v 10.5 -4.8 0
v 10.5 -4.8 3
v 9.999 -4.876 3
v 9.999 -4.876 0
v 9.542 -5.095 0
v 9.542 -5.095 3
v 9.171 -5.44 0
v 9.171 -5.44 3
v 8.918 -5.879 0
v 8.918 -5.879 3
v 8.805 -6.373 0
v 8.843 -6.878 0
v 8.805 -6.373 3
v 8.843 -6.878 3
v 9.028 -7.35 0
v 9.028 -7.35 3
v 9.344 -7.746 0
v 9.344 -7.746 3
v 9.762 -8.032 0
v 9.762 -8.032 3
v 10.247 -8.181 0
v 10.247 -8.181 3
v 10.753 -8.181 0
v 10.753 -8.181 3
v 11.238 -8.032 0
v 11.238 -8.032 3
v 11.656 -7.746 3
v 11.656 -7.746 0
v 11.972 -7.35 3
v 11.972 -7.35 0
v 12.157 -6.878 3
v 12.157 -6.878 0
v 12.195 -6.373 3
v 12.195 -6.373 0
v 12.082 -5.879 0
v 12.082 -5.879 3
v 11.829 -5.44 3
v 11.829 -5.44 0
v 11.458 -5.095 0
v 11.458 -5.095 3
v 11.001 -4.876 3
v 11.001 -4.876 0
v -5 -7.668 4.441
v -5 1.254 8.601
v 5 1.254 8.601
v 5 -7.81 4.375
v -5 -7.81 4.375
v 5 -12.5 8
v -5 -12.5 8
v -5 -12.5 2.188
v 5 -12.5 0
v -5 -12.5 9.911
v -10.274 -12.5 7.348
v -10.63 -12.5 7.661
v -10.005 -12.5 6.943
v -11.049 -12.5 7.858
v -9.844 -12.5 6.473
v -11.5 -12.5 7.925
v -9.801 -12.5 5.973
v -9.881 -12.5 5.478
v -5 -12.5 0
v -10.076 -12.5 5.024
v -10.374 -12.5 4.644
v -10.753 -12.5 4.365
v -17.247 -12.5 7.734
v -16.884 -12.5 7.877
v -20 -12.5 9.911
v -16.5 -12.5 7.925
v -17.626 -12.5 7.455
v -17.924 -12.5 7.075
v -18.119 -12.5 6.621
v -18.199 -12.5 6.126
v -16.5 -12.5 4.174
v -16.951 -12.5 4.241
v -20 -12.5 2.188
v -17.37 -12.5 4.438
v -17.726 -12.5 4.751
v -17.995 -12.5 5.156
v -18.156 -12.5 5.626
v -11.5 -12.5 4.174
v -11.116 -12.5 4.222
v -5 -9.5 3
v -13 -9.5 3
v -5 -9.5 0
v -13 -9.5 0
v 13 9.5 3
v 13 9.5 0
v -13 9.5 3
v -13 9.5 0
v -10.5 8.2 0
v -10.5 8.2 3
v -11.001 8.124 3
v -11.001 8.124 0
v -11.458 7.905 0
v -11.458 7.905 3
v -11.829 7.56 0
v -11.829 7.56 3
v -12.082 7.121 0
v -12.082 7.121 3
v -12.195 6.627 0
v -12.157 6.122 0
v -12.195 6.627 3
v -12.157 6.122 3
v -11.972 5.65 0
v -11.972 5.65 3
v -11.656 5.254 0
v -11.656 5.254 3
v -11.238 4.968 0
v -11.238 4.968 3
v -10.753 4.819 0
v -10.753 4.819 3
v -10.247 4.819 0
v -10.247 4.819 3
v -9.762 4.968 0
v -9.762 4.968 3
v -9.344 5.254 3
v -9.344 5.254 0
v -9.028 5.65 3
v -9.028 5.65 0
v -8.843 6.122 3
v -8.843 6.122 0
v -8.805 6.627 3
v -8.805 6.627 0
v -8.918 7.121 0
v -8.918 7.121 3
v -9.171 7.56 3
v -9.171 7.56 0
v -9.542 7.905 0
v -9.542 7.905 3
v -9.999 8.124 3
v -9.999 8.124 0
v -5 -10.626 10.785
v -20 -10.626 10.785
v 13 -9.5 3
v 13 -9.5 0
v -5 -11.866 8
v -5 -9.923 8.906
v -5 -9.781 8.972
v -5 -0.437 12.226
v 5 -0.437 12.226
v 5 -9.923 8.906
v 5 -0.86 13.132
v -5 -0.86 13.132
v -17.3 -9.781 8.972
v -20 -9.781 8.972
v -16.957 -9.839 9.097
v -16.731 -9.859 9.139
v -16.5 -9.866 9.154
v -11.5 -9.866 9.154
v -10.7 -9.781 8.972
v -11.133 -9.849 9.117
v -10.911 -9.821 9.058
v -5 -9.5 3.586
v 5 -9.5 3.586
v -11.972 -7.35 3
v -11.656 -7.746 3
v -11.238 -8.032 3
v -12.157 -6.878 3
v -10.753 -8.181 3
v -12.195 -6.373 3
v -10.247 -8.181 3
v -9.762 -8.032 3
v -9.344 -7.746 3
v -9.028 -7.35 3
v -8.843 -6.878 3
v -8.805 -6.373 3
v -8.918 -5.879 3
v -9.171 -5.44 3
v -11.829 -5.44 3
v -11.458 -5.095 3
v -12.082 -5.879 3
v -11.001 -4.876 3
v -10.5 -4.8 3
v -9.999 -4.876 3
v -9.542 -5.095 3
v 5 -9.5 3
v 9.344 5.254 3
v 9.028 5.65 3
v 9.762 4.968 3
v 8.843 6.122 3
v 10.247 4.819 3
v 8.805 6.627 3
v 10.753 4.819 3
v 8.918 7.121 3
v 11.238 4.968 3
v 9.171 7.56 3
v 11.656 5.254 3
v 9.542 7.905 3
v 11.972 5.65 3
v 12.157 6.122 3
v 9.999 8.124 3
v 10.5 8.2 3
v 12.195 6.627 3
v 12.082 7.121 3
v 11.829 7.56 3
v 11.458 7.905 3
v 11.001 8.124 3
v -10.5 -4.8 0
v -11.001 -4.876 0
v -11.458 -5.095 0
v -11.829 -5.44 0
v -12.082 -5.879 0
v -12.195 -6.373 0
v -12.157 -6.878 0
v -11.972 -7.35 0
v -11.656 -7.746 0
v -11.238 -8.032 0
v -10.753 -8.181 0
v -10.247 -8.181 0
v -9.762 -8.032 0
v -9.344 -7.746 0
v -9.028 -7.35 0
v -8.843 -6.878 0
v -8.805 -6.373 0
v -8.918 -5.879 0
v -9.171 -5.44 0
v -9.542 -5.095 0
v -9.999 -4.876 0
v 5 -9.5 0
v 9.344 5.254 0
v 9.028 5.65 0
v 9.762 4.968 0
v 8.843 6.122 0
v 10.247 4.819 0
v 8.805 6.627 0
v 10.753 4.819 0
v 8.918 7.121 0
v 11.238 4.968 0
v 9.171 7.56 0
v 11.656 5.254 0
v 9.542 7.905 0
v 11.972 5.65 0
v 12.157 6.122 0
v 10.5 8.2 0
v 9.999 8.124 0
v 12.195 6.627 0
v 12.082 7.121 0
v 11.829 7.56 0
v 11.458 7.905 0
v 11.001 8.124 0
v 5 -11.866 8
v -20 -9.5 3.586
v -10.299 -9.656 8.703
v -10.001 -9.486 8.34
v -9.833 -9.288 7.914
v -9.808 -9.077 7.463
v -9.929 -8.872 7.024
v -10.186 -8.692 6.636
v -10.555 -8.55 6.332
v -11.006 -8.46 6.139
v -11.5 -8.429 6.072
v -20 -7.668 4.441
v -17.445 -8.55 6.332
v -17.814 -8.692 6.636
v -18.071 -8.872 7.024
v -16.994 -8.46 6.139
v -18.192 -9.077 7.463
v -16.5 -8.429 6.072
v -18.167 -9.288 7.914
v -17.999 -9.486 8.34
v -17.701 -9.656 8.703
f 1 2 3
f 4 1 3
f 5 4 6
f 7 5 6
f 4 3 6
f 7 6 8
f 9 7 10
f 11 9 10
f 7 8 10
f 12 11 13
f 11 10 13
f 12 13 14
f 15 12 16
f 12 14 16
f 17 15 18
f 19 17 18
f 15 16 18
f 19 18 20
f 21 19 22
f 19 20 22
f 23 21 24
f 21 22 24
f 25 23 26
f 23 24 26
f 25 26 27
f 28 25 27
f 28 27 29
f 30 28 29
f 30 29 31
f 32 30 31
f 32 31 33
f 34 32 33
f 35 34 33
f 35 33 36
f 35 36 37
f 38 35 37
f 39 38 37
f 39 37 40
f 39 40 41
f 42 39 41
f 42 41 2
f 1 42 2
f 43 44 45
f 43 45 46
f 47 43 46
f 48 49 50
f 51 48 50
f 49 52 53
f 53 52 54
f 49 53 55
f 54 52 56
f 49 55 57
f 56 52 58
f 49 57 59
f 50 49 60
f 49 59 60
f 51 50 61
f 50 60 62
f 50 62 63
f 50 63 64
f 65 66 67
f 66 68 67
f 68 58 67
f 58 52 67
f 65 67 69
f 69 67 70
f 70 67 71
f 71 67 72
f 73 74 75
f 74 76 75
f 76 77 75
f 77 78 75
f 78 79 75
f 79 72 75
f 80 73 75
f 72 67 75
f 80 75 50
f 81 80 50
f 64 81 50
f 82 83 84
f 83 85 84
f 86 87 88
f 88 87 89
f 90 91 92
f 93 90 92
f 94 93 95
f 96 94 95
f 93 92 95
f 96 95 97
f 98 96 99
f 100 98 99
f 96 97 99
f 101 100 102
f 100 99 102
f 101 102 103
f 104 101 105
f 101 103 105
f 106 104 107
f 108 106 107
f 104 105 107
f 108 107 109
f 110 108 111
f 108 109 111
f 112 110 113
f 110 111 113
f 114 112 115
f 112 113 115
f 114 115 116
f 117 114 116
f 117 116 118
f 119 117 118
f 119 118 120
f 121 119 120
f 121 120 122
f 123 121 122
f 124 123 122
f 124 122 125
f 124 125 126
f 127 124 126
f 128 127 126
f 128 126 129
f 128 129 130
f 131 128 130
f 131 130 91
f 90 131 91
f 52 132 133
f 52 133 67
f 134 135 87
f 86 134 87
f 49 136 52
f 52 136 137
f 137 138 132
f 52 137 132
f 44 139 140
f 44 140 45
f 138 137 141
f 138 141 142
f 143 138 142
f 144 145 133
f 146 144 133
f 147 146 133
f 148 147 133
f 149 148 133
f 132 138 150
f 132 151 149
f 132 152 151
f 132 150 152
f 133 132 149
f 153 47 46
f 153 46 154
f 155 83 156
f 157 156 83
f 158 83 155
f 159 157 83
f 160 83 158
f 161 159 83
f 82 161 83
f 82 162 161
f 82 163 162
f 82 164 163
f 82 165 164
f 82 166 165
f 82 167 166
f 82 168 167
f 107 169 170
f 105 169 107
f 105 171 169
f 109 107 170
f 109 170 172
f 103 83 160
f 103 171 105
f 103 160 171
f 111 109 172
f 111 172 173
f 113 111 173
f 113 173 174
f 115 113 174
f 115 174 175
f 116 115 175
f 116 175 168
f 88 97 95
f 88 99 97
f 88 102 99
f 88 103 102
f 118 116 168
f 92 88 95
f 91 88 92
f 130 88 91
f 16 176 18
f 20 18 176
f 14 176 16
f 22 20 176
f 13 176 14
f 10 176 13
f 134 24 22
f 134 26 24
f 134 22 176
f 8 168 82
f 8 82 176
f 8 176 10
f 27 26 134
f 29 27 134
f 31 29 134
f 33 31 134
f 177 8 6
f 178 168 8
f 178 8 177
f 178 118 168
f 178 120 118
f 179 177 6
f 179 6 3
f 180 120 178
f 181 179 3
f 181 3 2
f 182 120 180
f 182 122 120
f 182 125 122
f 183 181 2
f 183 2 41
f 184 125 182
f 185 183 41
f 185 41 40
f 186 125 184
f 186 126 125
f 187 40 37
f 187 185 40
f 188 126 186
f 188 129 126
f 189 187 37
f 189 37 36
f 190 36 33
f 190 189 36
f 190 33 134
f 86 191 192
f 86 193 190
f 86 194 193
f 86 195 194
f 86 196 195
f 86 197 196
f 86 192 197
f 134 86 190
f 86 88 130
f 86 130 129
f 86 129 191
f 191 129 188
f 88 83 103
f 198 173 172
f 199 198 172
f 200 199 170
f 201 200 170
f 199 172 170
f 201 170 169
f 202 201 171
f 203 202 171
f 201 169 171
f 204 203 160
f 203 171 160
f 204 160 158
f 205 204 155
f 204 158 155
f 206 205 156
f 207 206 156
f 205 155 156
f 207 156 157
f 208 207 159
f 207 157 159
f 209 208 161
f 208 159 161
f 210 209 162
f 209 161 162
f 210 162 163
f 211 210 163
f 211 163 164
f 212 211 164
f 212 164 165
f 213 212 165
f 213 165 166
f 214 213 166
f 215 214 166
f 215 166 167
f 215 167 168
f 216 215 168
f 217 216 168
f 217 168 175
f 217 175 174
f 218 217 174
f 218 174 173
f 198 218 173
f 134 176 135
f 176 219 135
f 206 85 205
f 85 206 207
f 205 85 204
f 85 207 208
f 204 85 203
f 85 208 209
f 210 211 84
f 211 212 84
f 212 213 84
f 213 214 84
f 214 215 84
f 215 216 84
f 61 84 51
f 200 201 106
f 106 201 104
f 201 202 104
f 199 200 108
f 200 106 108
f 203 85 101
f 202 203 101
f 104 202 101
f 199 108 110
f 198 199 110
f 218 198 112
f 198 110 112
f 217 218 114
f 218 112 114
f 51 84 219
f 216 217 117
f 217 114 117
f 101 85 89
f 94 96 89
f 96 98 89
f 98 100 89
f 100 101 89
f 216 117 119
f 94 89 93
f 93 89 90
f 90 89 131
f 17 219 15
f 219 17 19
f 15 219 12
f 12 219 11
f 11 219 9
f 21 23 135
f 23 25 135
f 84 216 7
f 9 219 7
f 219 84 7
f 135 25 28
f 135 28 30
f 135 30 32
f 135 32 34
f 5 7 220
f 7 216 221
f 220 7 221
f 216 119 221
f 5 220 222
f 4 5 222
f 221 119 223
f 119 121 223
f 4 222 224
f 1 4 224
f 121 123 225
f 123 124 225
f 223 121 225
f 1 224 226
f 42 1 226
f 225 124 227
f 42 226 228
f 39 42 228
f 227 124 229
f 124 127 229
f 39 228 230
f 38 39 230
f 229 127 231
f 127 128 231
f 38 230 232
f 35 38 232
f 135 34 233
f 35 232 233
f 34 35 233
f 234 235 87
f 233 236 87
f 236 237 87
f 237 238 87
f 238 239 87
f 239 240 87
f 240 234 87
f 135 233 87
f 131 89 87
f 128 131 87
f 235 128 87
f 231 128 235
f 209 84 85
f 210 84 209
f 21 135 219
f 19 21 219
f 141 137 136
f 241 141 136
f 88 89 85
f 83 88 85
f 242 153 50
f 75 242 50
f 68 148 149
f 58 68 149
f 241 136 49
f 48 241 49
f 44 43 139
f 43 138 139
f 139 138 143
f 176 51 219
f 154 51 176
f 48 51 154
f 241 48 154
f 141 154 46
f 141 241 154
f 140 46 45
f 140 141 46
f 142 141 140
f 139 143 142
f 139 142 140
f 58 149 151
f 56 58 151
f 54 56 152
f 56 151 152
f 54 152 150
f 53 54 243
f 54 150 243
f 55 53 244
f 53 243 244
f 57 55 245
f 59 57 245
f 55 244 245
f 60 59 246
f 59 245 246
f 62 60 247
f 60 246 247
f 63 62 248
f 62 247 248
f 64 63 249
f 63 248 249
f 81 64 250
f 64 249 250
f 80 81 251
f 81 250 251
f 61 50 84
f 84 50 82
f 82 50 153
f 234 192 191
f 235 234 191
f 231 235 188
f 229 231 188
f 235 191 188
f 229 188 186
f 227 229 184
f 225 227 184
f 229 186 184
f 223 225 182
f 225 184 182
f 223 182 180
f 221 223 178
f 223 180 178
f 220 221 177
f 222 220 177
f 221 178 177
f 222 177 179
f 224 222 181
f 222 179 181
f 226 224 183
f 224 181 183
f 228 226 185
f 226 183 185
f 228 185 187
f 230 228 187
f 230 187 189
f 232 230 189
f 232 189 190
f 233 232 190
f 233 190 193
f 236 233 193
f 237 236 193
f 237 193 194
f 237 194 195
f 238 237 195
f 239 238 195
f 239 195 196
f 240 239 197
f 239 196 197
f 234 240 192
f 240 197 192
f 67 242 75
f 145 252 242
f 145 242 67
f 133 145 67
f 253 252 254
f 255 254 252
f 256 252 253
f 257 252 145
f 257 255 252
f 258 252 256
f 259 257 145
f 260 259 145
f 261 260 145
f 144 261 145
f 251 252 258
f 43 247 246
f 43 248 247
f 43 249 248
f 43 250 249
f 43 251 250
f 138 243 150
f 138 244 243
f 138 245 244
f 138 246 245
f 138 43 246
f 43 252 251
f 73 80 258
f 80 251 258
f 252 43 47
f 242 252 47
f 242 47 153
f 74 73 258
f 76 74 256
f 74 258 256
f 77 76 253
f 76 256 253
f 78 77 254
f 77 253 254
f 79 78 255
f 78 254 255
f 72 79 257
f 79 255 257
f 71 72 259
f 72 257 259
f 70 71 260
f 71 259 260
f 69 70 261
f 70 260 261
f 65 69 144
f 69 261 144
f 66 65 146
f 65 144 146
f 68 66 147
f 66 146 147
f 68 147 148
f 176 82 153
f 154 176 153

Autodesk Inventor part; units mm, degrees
ref_plane "YZ Plane" through (0, 0, 0) normal (1, 0, 0) x (0, 1, 0)
ref_plane "XZ Plane" through (0, 0, 0) normal (0, 1, 0) x (-1, 0, 0)
ref_plane "XY Plane" through (0, 0, 0) normal (0, 0, 1) x (1, 0, 0)
sketch "Sketch2" plane through (0, 0, 0) normal (0, 0, 1) x (1, 0, 0)
  line L0 (-13, -9.5) -> (13, -9.5)
  line L1 (13, -9.5) -> (13, 9.5)
  line L2 (13, 9.5) -> (-13, 9.5)
  line L3 (-13, 9.5) -> (-13, -9.5)
  line L4 (-13, -9.5) -> (13, 9.5) construction
  line L5 (13, -9.5) -> (-13, 9.5) construction
  point P0 (0, 0)
  dimension "d2" = 26
  dimension "d3" = 19
extrude "Extrusion1" add sketch "Sketch2" along normal blind 3
sketch "Sketch1" plane through (0, 0, 0) normal (0, 0, 1) x (1, 0, 0)
  line L0 (-10.5, -6.5) -> (10.5, -6.5) construction
  line L1 (10.5, -6.5) -> (10.5, 6.5) construction
  line L2 (10.5, 6.5) -> (-10.5, 6.5) construction
  line L3 (-10.5, 6.5) -> (-10.5, -6.5) construction
  line L4 (-10.5, -6.5) -> (10.5, 6.5) construction
  line L5 (10.5, -6.5) -> (-10.5, 6.5) construction
  point P0 (0, 0)
  dimension "d0" = 21
  dimension "d1" = 13
hole "Hole1" at (10.5, 6.5, 0) at (-10.5, 6.5, 0) at (10.5, -6.5, 0) at (-10.5, -6.5, 0) direction (0, 0, 1) diameter 3.4 end through all
sketch "Sketch3" plane through (0, 0, 0) normal (1, 0, 0) x (0, 1, 0)
  line L0 (-9.5, 0) -> (9.5, 0) projected
  line L1 (9.5, 0) -> (9.5, 3) projected
  line L2 (-9.5, 3) -> (9.5, 3) projected
  line L3 (-9.5, 0) -> (-9.5, 3) projected
  line L4 (-9.5, 0) -> (9.5, 0) projected
  line L5 (-9.5, 0) -> (-9.5, 8)
  line L6 (-9.5, 8) -> (-12.5, 8)
  line L7 (-12.5, 8) -> (-12.5, 0)
  line L8 (-12.5, 0) -> (-9.5, 0)
  line L9 (-9.5, 8) -> (-0.4369, 12.2262)
  line L10 (-0.4369, 12.2262) -> (1.2536, 8.601)
  line L11 (1.2536, 8.601) -> (-7.8095, 4.3748)
  line L12 (-7.8095, 4.3748) -> (-9.5, 8)
  line L13 (-9.5, 8) -> (0.5, 8) construction
  line L14 (-7.8095, 4.3748) -> (-9.5, 3.5865)
  line L15 (-0.4369, 12.2262) -> (-9.5, 8)
  line L16 (-9.5, 8) -> (-9.9226, 8.9063)
  line L17 (-9.9226, 8.9063) -> (-0.8595, 13.1325)
  line L18 (-0.8595, 13.1325) -> (-0.4369, 12.2262)
  line L19 (-9.9226, 8.9063) -> (-11.8662, 8)
  point P0 (0, 0)
  point P1 (-11, 8)
  dimension "d13" = 3
  dimension "d14" = 8
  dimension "d15" = 25
  dimension "d16" = 4
  dimension "d17" = 10
  dimension "d20" = 1
  dimension "d21" = 2.1445
extrude "Extrusion2" add sketch "Sketch3" along normal mid plane 10 contours L8 L7 L6 L5 L3 | L5 L12 L14 | L16 L17 L18 L9 | L9 L10 L11 L12 | L6 L19 L16
sketch "Sketch4" plane through (-5, 0, 0) normal (-1, 0, 0) x (0, 0, 1)
  line L0 (8.601, 1.2536) -> (3.5865, -9.5) projected
  line L1 (13.1325, -0.8595) -> (8, -11.8662) projected
  line L2 (4.4408, -7.668) -> (2.1876, -12.5)
  line L3 (0, -12.5) -> (8, -12.5) projected
  line L4 (9.5697, -8.5) -> (7.7045, -12.5)
  line L5 (7.7045, -12.5) -> (2.1876, -12.5)
  line L6 (4.4408, -7.668) -> (8.9723, -9.7811)
  line L7 (13.1325, -0.8595) -> (8.601, 1.2536) projected
  line L8 (8.9723, -9.7811) -> (10.7849, -10.6263)
  line L9 (10.7849, -10.6263) -> (9.9112, -12.5)
  line L10 (9.9112, -12.5) -> (7.7045, -12.5)
  line L11 (8, -11.8662) -> (8, -12.5) projected
  point P0 (0, 0)
  point P1 (8, -11.8662)
  point P2 (8, -11.8662)
  dimension "d25" = 3
  dimension "d33" = 2
extrude "Extrusion3" add sketch "Sketch4" along normal blind 15 contours L6 L1 L4 L3 L2 L0 | L8 L9 L10 L11 L1 | L11 L3 L4
sketch "Sketch6" plane through (-20, -7.668, 4.4408) normal (0, 0.9063, 0.4226) x (1, 0, 0)
  line L0 (3.5, -3.5) -> (8.5, -3.5) construction
  line L1 (3.5, -5.2) -> (8.5, -5.2)
  line L2 (8.5, -1.8) -> (3.5, -1.8)
  arc A0 (3.5, -1.8) -> (3.5, -5.2) centre (3.5, -3.5) ccw
  arc A1 (8.5, -5.2) -> (8.5, -1.8) centre (8.5, -3.5) ccw
  line L3 (0, -7) -> (0, 0) projected
  point P0 (20, 7.2653)
  point P1 (6, -3.5)
  point P2 (0, -3.5)
  dimension "d34" = 5
  dimension "d35" = 3.4
  dimension "d36" = 6
extrude "Extrusion5" cut sketch "Sketch6" against normal through all
properties part number "cam mount prototype"
